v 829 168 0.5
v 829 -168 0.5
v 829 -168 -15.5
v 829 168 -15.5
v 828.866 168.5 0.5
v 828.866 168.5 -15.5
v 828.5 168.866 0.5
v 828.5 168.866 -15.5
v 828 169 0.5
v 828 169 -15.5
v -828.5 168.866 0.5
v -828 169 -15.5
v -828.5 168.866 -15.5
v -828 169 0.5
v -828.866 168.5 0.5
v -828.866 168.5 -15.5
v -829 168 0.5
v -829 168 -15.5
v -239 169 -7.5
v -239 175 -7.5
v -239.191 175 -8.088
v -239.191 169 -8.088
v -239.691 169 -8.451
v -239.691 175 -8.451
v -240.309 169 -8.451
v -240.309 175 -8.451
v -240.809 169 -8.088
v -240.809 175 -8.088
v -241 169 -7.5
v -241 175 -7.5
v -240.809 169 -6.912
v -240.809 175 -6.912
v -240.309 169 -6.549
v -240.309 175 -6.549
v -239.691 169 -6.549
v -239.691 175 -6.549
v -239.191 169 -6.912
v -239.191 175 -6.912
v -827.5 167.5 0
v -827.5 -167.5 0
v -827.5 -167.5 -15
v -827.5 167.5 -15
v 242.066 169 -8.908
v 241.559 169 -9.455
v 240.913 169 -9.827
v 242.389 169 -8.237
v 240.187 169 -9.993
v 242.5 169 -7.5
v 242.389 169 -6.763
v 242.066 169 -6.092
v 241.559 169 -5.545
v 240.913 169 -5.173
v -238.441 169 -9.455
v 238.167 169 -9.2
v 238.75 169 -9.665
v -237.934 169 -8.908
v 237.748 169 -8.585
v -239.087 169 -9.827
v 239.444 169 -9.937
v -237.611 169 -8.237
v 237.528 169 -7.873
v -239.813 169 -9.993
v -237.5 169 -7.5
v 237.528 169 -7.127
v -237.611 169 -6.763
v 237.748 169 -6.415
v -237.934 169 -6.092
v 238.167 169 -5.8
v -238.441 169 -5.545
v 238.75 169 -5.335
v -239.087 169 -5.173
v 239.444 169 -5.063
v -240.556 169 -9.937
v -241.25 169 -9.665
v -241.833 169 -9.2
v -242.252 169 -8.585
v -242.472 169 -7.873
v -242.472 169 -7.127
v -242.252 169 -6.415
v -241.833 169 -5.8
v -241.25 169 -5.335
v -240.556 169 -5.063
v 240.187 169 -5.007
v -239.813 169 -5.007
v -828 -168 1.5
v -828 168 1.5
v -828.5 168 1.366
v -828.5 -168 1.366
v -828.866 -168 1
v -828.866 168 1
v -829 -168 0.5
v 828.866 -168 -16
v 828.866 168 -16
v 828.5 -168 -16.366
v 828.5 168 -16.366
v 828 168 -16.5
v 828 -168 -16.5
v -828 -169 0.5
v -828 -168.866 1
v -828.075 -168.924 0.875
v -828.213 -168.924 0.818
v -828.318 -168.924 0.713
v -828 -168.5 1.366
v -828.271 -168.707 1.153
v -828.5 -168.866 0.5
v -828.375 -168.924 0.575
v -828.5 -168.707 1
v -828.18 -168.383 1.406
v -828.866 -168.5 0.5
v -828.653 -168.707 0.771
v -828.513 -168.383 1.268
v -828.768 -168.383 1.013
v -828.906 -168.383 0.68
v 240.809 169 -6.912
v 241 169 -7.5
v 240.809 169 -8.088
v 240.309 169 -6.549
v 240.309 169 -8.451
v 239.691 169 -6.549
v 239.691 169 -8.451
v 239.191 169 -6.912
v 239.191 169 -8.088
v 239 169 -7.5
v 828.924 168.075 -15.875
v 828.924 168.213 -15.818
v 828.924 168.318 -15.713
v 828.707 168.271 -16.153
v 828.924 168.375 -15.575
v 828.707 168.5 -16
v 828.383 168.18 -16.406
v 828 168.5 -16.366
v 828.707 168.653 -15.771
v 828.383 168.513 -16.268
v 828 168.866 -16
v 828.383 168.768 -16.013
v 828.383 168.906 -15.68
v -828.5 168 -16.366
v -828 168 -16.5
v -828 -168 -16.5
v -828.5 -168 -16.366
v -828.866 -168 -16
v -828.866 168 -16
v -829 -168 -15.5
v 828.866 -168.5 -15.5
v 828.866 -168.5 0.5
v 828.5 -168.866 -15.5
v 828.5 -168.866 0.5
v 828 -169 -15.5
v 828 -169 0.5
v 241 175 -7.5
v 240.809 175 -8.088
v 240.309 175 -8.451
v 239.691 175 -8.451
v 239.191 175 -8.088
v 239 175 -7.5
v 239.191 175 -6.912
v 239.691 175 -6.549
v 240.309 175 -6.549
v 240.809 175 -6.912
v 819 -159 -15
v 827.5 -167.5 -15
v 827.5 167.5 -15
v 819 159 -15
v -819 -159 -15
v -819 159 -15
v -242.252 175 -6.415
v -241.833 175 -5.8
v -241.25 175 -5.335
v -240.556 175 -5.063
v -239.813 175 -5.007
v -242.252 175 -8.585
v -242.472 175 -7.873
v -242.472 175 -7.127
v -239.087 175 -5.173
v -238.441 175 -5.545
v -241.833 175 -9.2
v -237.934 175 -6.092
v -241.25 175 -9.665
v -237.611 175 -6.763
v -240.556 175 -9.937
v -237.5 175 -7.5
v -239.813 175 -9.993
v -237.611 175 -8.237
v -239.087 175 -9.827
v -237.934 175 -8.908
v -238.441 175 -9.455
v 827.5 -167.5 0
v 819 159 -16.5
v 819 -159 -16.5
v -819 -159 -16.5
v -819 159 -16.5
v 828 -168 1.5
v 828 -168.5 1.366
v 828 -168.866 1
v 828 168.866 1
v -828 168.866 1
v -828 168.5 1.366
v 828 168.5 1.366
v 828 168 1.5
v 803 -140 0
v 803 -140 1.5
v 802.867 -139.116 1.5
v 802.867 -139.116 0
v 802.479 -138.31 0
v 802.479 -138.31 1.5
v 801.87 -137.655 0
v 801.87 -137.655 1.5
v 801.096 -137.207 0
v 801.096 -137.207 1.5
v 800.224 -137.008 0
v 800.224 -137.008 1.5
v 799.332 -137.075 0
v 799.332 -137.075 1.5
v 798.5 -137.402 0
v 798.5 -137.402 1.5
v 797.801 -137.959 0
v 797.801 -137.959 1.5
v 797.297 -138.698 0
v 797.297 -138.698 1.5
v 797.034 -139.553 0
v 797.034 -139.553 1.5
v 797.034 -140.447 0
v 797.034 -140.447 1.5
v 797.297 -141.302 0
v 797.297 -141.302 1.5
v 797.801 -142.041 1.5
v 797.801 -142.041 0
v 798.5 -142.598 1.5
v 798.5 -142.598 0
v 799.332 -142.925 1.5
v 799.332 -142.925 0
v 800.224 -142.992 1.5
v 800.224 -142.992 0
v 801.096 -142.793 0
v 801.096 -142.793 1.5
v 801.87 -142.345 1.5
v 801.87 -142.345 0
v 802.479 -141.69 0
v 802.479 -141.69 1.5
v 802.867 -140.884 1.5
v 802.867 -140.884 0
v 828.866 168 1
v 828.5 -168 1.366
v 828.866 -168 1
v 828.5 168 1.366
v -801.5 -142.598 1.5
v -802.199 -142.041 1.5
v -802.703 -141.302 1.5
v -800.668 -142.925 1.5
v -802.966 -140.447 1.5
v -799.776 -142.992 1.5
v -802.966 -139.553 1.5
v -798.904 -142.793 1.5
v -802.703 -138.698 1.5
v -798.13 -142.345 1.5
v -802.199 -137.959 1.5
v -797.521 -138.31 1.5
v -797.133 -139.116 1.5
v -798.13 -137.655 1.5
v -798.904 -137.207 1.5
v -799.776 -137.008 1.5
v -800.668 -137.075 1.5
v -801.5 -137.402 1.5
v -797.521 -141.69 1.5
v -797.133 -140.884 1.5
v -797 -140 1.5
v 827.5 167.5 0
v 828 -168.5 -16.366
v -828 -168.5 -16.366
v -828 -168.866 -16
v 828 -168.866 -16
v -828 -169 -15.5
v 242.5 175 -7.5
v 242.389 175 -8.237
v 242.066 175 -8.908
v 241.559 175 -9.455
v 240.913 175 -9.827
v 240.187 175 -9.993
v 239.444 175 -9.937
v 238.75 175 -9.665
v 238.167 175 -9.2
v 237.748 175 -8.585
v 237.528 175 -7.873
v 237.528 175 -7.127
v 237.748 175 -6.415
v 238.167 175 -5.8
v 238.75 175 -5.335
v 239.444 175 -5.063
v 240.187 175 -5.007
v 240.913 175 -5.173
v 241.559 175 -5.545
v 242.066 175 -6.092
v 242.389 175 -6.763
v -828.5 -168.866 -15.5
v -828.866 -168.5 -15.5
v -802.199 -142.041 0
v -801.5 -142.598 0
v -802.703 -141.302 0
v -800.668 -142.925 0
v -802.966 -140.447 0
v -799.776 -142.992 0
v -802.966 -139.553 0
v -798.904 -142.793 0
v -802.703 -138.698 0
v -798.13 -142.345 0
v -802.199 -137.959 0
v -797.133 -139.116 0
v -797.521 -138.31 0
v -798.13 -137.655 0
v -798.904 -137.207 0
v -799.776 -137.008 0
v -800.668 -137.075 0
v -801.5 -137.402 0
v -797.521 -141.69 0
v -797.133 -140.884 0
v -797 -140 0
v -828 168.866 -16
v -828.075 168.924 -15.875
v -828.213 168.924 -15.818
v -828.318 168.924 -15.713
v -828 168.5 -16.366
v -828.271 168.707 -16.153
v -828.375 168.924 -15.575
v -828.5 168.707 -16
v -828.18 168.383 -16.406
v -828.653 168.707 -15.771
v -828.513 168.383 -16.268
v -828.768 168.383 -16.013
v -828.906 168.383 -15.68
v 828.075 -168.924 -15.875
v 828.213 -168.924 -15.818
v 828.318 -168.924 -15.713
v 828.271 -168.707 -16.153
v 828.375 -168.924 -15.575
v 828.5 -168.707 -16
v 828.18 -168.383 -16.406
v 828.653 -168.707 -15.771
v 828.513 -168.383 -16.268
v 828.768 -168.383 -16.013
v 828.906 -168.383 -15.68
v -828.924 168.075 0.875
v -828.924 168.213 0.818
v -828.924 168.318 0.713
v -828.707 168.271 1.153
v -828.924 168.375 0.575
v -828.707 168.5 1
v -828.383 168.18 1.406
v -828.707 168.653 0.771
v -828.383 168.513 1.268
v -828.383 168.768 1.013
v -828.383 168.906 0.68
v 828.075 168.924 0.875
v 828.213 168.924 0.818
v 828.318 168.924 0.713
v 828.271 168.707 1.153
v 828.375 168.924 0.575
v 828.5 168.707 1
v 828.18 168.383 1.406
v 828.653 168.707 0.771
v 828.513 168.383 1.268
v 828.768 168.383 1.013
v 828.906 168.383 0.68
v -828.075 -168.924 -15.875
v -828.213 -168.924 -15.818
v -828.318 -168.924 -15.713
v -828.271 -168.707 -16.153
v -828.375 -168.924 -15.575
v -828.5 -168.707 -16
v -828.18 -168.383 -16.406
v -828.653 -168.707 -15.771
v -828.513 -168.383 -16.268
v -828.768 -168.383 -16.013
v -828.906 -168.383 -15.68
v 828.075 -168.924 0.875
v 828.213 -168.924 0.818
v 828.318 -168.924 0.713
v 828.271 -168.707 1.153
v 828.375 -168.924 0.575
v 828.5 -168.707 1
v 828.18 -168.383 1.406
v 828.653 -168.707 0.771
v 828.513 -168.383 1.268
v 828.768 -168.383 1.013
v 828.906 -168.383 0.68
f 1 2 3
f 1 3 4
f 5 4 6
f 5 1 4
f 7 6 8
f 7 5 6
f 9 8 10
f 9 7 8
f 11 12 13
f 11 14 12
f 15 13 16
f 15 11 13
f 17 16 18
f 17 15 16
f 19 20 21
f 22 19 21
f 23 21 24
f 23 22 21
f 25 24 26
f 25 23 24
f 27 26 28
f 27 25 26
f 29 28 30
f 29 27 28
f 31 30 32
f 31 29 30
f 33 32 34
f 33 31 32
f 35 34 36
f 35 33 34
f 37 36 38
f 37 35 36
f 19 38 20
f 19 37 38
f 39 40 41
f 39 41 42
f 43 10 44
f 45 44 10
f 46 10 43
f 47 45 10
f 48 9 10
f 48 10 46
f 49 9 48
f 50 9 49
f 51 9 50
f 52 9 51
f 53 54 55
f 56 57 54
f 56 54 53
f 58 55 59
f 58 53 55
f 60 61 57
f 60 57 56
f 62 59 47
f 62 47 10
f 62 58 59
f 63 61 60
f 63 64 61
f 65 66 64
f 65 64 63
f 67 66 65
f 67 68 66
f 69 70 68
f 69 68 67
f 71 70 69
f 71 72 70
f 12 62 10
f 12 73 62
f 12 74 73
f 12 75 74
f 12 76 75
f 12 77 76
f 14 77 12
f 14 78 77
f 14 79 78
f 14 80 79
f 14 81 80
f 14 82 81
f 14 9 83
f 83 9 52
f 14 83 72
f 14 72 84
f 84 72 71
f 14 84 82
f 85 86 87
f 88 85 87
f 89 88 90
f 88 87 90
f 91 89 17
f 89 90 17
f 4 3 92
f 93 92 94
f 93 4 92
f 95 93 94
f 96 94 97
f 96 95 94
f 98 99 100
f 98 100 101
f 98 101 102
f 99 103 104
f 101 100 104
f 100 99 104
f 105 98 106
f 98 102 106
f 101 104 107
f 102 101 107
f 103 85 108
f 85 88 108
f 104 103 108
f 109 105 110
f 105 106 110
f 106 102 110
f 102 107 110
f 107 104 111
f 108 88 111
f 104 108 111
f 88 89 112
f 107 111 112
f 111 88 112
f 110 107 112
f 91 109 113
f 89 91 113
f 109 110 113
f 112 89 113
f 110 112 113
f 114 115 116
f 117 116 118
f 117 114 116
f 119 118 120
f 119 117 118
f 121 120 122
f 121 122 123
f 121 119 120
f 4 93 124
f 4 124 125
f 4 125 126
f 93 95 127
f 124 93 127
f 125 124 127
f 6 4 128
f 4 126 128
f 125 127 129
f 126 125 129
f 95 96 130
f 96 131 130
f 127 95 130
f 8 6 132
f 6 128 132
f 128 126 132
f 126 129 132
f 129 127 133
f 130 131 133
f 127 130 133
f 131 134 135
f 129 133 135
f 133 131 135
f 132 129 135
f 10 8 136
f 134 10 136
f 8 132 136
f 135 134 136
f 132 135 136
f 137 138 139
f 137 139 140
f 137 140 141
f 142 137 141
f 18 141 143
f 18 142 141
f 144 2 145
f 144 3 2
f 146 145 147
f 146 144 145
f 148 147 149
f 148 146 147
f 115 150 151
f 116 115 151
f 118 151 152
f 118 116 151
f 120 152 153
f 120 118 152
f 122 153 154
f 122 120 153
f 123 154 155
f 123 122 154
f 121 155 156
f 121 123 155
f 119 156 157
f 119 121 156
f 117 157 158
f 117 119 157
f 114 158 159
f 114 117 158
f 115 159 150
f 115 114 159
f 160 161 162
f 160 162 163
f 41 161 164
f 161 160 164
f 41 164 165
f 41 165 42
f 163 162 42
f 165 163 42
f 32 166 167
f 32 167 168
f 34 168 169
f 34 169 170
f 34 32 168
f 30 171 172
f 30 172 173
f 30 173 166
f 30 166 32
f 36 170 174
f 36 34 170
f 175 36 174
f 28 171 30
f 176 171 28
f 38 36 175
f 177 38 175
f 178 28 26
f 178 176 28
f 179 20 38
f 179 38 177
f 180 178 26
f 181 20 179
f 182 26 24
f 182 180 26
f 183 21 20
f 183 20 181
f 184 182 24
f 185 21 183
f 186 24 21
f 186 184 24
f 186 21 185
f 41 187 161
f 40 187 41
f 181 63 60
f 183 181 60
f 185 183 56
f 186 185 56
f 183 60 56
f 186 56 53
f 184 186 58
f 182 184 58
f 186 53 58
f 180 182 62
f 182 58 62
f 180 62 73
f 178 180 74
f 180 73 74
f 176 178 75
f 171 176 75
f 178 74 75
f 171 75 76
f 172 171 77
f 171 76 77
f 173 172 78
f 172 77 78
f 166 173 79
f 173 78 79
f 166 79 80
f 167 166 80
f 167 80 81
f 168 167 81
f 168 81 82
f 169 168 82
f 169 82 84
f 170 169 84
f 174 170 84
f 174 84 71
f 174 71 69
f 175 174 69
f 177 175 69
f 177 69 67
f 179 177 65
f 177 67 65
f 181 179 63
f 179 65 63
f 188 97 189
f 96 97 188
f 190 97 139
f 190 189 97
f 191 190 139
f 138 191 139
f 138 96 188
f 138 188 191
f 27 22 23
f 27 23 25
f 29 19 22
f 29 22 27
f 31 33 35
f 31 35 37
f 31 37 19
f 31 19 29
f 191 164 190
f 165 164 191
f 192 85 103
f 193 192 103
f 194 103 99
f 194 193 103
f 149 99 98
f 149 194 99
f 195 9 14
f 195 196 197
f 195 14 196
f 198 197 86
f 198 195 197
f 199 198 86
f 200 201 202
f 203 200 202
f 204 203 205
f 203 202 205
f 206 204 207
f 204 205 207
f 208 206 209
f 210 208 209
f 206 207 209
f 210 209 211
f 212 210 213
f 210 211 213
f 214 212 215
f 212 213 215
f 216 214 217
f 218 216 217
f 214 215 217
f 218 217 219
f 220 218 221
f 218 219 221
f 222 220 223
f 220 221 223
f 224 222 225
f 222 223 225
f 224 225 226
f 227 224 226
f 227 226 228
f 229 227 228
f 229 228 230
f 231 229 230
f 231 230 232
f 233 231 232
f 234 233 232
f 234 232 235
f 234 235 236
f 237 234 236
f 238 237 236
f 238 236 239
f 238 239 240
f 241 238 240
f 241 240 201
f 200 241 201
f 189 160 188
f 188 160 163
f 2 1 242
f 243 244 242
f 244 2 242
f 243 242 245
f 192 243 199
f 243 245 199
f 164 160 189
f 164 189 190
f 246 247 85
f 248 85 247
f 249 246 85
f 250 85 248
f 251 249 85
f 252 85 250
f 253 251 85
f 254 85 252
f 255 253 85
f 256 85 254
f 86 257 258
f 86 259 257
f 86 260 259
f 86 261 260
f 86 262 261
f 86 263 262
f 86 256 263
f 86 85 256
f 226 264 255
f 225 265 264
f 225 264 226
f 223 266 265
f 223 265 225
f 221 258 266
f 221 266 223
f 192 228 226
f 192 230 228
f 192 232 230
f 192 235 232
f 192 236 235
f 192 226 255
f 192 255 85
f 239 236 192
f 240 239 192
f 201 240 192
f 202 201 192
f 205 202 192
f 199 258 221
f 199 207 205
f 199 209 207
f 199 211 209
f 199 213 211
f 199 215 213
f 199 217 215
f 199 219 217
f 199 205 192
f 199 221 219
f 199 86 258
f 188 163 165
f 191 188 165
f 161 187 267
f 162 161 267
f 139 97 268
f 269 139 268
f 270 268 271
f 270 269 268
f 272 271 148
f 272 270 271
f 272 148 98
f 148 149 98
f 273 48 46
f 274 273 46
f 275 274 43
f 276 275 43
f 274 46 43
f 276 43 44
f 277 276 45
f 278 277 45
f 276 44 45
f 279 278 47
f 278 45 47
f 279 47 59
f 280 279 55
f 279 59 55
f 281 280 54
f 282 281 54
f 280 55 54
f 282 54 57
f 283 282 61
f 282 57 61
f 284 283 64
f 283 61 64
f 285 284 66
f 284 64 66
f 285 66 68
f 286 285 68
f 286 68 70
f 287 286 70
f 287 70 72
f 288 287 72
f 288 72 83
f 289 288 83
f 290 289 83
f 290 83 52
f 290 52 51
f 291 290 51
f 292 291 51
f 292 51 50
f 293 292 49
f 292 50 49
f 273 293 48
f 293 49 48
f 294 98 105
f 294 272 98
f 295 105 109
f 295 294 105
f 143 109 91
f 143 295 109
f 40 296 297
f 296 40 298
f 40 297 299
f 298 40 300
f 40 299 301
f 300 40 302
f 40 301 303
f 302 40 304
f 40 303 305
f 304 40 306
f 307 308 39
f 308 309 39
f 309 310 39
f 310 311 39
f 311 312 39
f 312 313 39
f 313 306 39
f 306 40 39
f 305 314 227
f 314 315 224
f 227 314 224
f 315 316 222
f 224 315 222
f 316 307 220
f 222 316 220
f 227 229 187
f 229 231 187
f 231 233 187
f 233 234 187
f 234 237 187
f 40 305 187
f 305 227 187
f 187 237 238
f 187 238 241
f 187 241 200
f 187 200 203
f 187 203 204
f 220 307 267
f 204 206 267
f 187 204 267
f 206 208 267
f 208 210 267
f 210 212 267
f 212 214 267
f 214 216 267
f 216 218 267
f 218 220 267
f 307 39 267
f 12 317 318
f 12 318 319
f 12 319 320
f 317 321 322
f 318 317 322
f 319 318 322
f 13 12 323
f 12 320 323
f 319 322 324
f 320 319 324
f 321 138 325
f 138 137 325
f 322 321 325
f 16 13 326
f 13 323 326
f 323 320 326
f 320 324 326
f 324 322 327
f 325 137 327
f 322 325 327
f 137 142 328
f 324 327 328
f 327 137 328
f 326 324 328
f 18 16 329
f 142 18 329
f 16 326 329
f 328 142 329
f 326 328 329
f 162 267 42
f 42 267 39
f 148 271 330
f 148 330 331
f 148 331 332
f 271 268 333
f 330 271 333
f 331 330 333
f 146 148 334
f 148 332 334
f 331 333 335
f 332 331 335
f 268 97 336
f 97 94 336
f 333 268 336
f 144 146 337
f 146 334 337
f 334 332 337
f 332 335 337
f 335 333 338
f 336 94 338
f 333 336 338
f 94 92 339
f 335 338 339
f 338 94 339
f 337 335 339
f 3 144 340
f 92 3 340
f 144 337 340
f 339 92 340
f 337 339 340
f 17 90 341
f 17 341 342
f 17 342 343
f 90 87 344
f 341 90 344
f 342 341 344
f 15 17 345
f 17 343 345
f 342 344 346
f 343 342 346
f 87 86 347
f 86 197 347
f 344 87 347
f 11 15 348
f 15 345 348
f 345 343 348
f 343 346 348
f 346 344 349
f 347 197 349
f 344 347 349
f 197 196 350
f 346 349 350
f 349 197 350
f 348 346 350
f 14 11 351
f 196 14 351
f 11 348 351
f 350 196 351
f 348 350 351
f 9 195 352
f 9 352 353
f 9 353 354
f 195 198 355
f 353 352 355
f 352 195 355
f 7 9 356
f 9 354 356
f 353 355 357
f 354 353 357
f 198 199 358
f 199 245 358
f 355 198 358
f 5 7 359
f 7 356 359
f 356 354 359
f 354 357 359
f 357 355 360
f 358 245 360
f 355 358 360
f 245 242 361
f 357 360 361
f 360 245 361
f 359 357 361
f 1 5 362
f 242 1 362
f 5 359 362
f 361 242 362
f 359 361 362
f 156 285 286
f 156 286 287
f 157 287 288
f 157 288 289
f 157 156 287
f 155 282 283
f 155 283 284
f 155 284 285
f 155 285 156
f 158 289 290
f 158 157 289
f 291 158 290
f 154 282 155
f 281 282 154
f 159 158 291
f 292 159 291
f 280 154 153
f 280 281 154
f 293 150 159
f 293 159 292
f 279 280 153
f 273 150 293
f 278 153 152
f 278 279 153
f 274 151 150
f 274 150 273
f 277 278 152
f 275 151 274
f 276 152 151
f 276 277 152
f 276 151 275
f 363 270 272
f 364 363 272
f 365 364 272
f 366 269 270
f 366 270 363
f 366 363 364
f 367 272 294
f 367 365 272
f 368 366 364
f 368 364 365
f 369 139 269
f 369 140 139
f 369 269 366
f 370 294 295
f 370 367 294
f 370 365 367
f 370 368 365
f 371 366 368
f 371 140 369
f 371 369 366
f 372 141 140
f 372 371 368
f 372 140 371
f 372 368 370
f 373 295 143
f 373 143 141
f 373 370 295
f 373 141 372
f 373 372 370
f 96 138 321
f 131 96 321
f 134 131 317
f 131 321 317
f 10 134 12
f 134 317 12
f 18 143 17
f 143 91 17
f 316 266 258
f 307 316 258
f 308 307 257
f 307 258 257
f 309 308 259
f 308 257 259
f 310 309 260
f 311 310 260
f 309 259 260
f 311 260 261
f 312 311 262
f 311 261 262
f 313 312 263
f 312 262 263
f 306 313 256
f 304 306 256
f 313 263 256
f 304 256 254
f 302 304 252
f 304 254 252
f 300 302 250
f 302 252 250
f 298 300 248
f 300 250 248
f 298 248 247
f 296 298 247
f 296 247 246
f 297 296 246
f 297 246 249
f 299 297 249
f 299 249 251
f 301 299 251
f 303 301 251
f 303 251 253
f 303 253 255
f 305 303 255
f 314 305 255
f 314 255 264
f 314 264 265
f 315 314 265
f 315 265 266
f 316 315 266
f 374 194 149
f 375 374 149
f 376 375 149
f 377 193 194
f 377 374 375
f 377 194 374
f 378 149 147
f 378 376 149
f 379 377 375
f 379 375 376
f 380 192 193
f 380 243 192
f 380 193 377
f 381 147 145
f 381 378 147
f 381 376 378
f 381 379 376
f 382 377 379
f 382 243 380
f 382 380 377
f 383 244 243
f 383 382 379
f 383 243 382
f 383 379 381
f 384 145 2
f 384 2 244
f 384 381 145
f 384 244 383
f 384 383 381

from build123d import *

# Parameters (mm, degrees)
SKETCH_1_W          = 1658
SKETCH_1_H          = 338
EXTRUDE_1_DEPTH     = 1.5
SKETCH_2_W          = 1658
SKETCH_2_H          = 338
SKETCH_2_W_2        = 1655
SKETCH_2_H_2        = 335
EXTRUDE_2_DEPTH     = 15
SKETCH_3_W          = 1658
SKETCH_3_H          = 338
SKETCH_3_W_2        = 1638
SKETCH_3_H_2        = 318
EXTRUDE_3_DEPTH     = 1.5
SKETCH_5_R          = 2.5
SKETCH_5_R_2        = 1
EXTRUDE_4_DEPTH     = 6
SKETCH_6_R          = 3
CUT_EXTRUDE_1_DEPTH = 19
FILLET_1_R          = 1


with BuildPart() as part:
    # 草图1 → 凸台-拉伸1 (new body)
    with BuildSketch(Plane.XY):
        Rectangle(SKETCH_1_W, SKETCH_1_H)
    extrude(amount=EXTRUDE_1_DEPTH)

    # 草图2 → 凸台-拉伸2 (add)
    with BuildSketch(Plane(origin=(0, 0, 0), x_dir=(-1, 0, 0), z_dir=(0, 0, -1))):
        Rectangle(SKETCH_2_W, SKETCH_2_H)
        Rectangle(SKETCH_2_W_2, SKETCH_2_H_2, mode=Mode.SUBTRACT)
    extrude(amount=EXTRUDE_2_DEPTH)

    # 草图3 → 凸台-拉伸3 (add)
    with BuildSketch(Plane(origin=(0, 0, -15), x_dir=(-1, 0, 0), z_dir=(0, 0, -1))):
        Rectangle(SKETCH_3_W, SKETCH_3_H)
        Rectangle(SKETCH_3_W_2, SKETCH_3_H_2, mode=Mode.SUBTRACT)
    extrude(amount=EXTRUDE_3_DEPTH)

    # 草图5 → 凸台-拉伸4 (add)
    with BuildSketch(Plane(origin=(0, 169, 0), x_dir=(1, 0, 0), z_dir=(0, 1, 0))):
        with Locations((240, 7.5)):
            Circle(SKETCH_5_R)
        with Locations((240, 7.5)):
            Circle(SKETCH_5_R_2, mode=Mode.SUBTRACT)
        with Locations((-240, 7.5)):
            Circle(SKETCH_5_R)
        with Locations((-240, 7.5)):
            Circle(SKETCH_5_R_2, mode=Mode.SUBTRACT)
    extrude(amount=EXTRUDE_4_DEPTH)

    # 草图6 → 切除-拉伸1 (cut, through all)
    with BuildSketch(Plane.XY.offset(1.5)):
        with Locations((-800, -140)):
            Circle(SKETCH_6_R)
        with Locations((800, -140)):
            Circle(SKETCH_6_R)
    extrude(amount=-CUT_EXTRUDE_1_DEPTH, mode=Mode.SUBTRACT)

    # 圆角1
    fillet_1_edges = [part.edges().sort_by_distance(p)[0] for p in [
        (829, 0, 1.5),
        (0, 169, 1.5),
        (-829, 0, -16.5),
        (0, 169, -16.5),
        (829, 0, -16.5),
        (0, -169, -16.5),
        (-829, 0, 1.5),
        (0, -169, 1.5),
        (-829, 169, -7.5),
        (829, 169, -7.5),
        (829, -169, -7.5),
        (-829, -169, -7.5),
    ]]
    fillet(fillet_1_edges, radius=FILLET_1_R)


solid = part.part
